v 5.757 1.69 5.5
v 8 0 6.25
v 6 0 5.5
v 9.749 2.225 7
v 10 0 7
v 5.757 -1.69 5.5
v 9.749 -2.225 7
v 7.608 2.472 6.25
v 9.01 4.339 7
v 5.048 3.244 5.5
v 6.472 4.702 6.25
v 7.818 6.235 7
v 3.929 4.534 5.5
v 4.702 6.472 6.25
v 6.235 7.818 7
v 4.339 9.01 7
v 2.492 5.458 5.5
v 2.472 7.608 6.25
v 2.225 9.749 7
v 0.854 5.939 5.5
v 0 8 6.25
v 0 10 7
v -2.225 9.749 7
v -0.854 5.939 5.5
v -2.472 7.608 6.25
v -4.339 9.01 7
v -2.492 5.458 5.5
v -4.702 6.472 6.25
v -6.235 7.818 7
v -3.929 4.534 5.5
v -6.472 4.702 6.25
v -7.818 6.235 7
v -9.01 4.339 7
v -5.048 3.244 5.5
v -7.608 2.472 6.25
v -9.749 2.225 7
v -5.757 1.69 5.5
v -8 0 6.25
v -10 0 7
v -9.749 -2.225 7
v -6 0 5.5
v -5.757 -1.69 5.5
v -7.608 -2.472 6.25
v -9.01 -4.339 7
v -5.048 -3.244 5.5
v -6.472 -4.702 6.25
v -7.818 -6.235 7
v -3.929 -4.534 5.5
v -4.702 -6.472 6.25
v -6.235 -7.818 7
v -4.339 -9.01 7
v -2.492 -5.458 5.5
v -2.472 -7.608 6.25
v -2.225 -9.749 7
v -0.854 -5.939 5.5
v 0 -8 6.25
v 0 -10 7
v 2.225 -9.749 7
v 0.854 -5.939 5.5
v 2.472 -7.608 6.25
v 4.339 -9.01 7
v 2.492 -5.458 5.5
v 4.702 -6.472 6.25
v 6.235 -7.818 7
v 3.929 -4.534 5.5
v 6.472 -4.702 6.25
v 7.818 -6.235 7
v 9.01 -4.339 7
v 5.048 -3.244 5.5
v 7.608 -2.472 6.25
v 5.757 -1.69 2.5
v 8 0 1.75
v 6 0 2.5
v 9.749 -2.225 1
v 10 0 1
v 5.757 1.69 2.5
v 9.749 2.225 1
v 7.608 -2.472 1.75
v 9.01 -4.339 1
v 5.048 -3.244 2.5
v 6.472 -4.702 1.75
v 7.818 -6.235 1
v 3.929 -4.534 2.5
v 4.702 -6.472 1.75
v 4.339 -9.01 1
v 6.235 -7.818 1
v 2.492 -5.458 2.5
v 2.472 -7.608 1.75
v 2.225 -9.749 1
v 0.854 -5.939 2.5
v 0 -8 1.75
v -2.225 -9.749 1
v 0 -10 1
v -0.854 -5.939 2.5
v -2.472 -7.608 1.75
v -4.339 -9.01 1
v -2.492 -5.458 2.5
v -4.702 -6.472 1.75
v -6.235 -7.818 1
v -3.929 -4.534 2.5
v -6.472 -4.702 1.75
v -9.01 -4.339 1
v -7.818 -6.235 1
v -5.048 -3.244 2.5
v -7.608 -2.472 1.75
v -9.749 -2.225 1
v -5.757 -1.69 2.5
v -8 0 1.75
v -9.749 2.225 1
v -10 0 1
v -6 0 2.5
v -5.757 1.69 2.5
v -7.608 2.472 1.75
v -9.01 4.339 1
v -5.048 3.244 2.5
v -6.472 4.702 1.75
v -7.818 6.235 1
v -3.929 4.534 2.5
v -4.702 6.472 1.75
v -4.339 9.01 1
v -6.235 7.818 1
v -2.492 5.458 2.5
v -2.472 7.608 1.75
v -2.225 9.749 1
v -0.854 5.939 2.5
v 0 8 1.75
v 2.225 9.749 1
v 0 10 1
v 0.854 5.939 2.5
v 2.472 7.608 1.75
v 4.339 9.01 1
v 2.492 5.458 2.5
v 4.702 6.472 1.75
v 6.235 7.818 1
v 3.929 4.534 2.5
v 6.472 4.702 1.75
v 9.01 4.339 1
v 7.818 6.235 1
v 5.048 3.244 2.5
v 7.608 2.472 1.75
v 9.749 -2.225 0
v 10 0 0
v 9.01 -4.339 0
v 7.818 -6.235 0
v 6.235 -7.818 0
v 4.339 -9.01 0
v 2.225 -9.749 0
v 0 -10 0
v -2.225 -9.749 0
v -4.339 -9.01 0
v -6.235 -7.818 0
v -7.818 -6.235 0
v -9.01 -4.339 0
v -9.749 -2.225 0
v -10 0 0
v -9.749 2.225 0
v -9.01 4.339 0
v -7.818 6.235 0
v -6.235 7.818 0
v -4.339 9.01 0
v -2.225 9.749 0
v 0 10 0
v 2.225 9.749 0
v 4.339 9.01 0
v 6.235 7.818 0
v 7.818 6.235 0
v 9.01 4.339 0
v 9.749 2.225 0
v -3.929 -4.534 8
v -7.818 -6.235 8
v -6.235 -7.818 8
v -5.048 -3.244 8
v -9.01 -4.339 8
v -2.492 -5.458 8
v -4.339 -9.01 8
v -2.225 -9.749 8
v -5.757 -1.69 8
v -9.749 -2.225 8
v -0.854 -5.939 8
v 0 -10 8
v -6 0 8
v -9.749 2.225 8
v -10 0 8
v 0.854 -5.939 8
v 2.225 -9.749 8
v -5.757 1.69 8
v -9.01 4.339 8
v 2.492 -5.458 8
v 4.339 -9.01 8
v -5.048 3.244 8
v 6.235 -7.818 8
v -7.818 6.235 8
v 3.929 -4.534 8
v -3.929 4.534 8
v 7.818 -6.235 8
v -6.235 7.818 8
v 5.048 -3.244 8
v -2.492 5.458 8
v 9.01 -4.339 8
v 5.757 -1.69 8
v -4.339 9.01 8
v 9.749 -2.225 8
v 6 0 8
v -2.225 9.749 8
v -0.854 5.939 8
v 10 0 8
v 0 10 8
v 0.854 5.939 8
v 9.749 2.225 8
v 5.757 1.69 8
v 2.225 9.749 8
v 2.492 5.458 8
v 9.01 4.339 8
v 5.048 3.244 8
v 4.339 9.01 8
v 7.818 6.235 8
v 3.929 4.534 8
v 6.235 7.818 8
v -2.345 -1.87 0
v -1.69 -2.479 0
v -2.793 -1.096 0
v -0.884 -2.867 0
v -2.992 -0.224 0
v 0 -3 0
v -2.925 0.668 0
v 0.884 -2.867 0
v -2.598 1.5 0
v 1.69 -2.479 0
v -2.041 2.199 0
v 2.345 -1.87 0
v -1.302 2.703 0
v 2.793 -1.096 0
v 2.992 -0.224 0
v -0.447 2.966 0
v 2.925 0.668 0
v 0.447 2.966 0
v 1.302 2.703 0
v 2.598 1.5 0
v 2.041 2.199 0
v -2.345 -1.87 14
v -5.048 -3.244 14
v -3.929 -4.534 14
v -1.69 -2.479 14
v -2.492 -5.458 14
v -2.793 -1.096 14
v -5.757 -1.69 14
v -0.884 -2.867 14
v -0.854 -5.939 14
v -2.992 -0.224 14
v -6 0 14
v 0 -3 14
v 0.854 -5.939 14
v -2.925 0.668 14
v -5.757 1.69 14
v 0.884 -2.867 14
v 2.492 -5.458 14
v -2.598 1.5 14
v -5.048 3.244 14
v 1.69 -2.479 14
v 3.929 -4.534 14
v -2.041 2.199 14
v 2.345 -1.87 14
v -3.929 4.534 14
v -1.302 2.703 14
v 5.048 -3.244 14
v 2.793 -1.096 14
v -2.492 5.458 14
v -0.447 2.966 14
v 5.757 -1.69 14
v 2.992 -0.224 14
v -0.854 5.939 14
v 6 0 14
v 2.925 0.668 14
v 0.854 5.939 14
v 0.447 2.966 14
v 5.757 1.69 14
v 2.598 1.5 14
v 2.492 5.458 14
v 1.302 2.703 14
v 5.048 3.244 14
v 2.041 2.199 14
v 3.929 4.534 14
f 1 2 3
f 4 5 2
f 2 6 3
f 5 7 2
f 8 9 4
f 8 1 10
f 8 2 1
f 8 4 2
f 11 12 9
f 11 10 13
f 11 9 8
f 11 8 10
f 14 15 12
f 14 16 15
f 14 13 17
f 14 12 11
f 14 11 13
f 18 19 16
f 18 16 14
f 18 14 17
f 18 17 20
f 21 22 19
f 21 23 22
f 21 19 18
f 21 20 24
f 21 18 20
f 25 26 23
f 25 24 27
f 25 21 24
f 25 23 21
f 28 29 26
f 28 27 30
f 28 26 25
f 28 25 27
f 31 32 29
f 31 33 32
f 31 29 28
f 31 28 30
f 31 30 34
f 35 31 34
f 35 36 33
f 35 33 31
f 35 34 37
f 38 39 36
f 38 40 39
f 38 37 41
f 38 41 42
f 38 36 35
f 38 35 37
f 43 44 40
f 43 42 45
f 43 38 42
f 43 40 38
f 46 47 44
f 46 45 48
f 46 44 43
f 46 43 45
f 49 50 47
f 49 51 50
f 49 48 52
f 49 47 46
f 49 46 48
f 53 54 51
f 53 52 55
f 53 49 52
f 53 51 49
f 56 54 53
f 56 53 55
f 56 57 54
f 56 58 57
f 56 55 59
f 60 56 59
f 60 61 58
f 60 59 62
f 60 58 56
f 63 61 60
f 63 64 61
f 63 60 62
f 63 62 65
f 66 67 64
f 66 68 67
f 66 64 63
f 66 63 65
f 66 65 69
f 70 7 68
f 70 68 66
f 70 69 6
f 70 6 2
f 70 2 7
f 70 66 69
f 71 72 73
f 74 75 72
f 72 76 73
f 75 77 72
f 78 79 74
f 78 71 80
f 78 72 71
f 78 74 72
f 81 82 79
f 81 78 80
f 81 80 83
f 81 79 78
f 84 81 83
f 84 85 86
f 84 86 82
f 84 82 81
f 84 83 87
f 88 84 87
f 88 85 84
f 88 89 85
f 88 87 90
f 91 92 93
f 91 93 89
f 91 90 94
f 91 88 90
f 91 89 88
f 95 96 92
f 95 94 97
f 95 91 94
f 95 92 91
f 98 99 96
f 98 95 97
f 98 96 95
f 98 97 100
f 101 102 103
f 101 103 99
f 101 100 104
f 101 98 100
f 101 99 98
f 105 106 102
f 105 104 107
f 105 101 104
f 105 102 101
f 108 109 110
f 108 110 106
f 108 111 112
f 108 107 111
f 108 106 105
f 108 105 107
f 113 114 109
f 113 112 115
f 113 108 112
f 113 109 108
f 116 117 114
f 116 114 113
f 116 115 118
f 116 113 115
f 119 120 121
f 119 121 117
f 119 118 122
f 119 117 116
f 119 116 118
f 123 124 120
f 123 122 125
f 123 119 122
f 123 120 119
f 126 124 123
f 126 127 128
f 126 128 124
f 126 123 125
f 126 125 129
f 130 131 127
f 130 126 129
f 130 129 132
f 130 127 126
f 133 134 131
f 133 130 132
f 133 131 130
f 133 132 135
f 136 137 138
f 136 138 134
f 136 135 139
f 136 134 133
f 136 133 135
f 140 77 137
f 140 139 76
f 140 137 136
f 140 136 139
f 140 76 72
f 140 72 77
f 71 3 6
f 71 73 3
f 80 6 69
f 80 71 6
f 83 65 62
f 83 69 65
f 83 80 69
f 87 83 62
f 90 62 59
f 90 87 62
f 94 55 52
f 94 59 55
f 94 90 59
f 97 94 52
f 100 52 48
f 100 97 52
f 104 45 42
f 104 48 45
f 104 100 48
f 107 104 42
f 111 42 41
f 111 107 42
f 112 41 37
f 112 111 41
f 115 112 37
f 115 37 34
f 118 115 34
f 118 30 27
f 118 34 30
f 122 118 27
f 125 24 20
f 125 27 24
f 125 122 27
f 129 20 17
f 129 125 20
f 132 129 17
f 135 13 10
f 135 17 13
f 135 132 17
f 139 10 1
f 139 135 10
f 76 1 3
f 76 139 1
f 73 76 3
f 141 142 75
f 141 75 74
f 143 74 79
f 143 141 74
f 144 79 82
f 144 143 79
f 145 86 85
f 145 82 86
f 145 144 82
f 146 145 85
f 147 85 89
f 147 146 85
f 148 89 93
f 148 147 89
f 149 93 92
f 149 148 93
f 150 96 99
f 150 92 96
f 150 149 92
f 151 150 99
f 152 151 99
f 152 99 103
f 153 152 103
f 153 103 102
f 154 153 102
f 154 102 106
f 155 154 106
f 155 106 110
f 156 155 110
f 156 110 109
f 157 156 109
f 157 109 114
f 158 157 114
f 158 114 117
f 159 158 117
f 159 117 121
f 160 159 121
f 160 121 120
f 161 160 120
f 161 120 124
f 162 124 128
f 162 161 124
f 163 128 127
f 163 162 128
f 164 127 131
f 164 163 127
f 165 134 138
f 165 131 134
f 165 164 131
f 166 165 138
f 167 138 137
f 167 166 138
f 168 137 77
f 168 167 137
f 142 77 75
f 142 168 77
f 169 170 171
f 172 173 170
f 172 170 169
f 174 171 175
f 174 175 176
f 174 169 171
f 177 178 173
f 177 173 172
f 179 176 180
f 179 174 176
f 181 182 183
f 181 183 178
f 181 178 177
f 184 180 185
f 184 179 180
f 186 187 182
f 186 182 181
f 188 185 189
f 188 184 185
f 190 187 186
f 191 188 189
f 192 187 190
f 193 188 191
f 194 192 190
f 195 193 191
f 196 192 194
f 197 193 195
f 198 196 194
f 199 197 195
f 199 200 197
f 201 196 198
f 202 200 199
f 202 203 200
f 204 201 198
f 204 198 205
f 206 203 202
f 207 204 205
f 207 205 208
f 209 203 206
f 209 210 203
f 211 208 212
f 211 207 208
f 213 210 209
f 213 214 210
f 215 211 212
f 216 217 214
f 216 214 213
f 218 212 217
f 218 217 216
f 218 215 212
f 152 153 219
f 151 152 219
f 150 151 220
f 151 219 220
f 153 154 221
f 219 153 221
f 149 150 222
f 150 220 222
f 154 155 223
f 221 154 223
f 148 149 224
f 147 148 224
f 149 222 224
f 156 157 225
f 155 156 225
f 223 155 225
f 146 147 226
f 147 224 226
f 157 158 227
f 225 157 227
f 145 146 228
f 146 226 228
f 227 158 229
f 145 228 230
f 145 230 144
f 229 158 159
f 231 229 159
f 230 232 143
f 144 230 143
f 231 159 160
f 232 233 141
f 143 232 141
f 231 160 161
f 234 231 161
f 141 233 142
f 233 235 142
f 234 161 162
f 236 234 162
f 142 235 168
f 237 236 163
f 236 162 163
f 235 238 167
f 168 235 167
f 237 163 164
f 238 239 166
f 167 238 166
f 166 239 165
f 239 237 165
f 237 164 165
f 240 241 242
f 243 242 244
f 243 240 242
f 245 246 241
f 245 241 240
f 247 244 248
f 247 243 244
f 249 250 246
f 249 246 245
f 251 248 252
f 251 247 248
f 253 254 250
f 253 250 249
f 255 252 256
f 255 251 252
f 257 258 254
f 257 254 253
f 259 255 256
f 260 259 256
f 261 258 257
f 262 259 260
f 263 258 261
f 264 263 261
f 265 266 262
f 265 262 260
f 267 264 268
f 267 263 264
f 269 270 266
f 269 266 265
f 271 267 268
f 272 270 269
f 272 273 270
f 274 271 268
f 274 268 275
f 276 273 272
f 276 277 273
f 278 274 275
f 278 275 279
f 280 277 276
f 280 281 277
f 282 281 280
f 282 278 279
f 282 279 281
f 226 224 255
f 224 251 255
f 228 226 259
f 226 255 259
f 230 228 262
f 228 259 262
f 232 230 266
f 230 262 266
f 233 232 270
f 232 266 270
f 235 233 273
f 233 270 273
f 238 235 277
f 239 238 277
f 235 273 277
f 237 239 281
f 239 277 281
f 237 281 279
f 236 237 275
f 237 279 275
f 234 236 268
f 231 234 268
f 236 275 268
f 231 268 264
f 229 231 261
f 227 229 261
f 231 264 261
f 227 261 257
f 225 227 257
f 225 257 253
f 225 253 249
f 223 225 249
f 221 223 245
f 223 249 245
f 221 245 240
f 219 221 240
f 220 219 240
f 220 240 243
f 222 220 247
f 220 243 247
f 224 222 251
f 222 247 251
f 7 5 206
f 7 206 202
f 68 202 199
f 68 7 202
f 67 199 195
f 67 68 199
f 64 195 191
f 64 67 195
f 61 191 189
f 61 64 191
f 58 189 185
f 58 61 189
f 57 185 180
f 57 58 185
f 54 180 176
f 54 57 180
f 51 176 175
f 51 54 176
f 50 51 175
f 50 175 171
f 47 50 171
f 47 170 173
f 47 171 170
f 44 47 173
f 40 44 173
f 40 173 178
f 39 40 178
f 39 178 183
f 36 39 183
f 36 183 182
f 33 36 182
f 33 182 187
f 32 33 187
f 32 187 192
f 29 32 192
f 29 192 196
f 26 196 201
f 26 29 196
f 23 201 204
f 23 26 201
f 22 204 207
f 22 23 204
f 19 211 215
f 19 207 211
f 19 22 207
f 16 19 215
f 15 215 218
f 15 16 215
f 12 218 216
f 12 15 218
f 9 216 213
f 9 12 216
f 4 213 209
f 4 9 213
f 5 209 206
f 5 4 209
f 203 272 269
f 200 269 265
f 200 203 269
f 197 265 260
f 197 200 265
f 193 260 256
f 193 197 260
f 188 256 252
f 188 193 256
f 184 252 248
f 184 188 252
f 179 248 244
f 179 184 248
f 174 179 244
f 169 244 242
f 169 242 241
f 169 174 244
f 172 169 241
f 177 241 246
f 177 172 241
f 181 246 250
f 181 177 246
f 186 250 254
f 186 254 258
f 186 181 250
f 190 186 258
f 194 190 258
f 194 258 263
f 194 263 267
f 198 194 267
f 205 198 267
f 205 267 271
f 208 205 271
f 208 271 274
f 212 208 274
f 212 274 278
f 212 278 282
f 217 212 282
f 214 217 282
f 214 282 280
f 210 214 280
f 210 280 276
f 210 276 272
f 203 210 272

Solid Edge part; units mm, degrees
sketch "Sketch1" plane through (0, 0, 0) normal (0, 0, 1) x (1, 0, 0)
  circle A0 centre (0, 0) radius 10
extrude "Protrusion1" add sketch "Sketch1" along normal blind 14
sketch "Sketch2" plane through (0, 0, 0) normal (0, -1, 0) x (1, 0, 0)
  line L0 (10, 14.2715) -> (6, 14.2715)
  line L1 (6, 14.2715) -> (6, 8)
  line L2 (6, 8) -> (10, 8)
  line L3 (10, 8) -> (10, 14.2715)
  line L4 (6, 5.5) -> (6, 2.5)
  line L5 (6, 2.5) -> (10, 1)
  line L6 (10, 7) -> (10, 1)
  line L7 (6, 5.5) -> (10, 7)
  dimension "D1" = 6
  dimension "D2" = 6
  dimension "D3" = 3
  dimension "D4" = 2.5
  dimension "D5" = 2.5
  dimension "D6" = 1
  dimension "D7" = 1
revolve "RevolvedCutout1" cut sketch "Sketch2" angle 360 about axis through (0, 0, 0) along (0, 0, 1)
hole "Hole_1" at (0, 0, 14) direction (0, 0, -1) diameter 6 end through all
